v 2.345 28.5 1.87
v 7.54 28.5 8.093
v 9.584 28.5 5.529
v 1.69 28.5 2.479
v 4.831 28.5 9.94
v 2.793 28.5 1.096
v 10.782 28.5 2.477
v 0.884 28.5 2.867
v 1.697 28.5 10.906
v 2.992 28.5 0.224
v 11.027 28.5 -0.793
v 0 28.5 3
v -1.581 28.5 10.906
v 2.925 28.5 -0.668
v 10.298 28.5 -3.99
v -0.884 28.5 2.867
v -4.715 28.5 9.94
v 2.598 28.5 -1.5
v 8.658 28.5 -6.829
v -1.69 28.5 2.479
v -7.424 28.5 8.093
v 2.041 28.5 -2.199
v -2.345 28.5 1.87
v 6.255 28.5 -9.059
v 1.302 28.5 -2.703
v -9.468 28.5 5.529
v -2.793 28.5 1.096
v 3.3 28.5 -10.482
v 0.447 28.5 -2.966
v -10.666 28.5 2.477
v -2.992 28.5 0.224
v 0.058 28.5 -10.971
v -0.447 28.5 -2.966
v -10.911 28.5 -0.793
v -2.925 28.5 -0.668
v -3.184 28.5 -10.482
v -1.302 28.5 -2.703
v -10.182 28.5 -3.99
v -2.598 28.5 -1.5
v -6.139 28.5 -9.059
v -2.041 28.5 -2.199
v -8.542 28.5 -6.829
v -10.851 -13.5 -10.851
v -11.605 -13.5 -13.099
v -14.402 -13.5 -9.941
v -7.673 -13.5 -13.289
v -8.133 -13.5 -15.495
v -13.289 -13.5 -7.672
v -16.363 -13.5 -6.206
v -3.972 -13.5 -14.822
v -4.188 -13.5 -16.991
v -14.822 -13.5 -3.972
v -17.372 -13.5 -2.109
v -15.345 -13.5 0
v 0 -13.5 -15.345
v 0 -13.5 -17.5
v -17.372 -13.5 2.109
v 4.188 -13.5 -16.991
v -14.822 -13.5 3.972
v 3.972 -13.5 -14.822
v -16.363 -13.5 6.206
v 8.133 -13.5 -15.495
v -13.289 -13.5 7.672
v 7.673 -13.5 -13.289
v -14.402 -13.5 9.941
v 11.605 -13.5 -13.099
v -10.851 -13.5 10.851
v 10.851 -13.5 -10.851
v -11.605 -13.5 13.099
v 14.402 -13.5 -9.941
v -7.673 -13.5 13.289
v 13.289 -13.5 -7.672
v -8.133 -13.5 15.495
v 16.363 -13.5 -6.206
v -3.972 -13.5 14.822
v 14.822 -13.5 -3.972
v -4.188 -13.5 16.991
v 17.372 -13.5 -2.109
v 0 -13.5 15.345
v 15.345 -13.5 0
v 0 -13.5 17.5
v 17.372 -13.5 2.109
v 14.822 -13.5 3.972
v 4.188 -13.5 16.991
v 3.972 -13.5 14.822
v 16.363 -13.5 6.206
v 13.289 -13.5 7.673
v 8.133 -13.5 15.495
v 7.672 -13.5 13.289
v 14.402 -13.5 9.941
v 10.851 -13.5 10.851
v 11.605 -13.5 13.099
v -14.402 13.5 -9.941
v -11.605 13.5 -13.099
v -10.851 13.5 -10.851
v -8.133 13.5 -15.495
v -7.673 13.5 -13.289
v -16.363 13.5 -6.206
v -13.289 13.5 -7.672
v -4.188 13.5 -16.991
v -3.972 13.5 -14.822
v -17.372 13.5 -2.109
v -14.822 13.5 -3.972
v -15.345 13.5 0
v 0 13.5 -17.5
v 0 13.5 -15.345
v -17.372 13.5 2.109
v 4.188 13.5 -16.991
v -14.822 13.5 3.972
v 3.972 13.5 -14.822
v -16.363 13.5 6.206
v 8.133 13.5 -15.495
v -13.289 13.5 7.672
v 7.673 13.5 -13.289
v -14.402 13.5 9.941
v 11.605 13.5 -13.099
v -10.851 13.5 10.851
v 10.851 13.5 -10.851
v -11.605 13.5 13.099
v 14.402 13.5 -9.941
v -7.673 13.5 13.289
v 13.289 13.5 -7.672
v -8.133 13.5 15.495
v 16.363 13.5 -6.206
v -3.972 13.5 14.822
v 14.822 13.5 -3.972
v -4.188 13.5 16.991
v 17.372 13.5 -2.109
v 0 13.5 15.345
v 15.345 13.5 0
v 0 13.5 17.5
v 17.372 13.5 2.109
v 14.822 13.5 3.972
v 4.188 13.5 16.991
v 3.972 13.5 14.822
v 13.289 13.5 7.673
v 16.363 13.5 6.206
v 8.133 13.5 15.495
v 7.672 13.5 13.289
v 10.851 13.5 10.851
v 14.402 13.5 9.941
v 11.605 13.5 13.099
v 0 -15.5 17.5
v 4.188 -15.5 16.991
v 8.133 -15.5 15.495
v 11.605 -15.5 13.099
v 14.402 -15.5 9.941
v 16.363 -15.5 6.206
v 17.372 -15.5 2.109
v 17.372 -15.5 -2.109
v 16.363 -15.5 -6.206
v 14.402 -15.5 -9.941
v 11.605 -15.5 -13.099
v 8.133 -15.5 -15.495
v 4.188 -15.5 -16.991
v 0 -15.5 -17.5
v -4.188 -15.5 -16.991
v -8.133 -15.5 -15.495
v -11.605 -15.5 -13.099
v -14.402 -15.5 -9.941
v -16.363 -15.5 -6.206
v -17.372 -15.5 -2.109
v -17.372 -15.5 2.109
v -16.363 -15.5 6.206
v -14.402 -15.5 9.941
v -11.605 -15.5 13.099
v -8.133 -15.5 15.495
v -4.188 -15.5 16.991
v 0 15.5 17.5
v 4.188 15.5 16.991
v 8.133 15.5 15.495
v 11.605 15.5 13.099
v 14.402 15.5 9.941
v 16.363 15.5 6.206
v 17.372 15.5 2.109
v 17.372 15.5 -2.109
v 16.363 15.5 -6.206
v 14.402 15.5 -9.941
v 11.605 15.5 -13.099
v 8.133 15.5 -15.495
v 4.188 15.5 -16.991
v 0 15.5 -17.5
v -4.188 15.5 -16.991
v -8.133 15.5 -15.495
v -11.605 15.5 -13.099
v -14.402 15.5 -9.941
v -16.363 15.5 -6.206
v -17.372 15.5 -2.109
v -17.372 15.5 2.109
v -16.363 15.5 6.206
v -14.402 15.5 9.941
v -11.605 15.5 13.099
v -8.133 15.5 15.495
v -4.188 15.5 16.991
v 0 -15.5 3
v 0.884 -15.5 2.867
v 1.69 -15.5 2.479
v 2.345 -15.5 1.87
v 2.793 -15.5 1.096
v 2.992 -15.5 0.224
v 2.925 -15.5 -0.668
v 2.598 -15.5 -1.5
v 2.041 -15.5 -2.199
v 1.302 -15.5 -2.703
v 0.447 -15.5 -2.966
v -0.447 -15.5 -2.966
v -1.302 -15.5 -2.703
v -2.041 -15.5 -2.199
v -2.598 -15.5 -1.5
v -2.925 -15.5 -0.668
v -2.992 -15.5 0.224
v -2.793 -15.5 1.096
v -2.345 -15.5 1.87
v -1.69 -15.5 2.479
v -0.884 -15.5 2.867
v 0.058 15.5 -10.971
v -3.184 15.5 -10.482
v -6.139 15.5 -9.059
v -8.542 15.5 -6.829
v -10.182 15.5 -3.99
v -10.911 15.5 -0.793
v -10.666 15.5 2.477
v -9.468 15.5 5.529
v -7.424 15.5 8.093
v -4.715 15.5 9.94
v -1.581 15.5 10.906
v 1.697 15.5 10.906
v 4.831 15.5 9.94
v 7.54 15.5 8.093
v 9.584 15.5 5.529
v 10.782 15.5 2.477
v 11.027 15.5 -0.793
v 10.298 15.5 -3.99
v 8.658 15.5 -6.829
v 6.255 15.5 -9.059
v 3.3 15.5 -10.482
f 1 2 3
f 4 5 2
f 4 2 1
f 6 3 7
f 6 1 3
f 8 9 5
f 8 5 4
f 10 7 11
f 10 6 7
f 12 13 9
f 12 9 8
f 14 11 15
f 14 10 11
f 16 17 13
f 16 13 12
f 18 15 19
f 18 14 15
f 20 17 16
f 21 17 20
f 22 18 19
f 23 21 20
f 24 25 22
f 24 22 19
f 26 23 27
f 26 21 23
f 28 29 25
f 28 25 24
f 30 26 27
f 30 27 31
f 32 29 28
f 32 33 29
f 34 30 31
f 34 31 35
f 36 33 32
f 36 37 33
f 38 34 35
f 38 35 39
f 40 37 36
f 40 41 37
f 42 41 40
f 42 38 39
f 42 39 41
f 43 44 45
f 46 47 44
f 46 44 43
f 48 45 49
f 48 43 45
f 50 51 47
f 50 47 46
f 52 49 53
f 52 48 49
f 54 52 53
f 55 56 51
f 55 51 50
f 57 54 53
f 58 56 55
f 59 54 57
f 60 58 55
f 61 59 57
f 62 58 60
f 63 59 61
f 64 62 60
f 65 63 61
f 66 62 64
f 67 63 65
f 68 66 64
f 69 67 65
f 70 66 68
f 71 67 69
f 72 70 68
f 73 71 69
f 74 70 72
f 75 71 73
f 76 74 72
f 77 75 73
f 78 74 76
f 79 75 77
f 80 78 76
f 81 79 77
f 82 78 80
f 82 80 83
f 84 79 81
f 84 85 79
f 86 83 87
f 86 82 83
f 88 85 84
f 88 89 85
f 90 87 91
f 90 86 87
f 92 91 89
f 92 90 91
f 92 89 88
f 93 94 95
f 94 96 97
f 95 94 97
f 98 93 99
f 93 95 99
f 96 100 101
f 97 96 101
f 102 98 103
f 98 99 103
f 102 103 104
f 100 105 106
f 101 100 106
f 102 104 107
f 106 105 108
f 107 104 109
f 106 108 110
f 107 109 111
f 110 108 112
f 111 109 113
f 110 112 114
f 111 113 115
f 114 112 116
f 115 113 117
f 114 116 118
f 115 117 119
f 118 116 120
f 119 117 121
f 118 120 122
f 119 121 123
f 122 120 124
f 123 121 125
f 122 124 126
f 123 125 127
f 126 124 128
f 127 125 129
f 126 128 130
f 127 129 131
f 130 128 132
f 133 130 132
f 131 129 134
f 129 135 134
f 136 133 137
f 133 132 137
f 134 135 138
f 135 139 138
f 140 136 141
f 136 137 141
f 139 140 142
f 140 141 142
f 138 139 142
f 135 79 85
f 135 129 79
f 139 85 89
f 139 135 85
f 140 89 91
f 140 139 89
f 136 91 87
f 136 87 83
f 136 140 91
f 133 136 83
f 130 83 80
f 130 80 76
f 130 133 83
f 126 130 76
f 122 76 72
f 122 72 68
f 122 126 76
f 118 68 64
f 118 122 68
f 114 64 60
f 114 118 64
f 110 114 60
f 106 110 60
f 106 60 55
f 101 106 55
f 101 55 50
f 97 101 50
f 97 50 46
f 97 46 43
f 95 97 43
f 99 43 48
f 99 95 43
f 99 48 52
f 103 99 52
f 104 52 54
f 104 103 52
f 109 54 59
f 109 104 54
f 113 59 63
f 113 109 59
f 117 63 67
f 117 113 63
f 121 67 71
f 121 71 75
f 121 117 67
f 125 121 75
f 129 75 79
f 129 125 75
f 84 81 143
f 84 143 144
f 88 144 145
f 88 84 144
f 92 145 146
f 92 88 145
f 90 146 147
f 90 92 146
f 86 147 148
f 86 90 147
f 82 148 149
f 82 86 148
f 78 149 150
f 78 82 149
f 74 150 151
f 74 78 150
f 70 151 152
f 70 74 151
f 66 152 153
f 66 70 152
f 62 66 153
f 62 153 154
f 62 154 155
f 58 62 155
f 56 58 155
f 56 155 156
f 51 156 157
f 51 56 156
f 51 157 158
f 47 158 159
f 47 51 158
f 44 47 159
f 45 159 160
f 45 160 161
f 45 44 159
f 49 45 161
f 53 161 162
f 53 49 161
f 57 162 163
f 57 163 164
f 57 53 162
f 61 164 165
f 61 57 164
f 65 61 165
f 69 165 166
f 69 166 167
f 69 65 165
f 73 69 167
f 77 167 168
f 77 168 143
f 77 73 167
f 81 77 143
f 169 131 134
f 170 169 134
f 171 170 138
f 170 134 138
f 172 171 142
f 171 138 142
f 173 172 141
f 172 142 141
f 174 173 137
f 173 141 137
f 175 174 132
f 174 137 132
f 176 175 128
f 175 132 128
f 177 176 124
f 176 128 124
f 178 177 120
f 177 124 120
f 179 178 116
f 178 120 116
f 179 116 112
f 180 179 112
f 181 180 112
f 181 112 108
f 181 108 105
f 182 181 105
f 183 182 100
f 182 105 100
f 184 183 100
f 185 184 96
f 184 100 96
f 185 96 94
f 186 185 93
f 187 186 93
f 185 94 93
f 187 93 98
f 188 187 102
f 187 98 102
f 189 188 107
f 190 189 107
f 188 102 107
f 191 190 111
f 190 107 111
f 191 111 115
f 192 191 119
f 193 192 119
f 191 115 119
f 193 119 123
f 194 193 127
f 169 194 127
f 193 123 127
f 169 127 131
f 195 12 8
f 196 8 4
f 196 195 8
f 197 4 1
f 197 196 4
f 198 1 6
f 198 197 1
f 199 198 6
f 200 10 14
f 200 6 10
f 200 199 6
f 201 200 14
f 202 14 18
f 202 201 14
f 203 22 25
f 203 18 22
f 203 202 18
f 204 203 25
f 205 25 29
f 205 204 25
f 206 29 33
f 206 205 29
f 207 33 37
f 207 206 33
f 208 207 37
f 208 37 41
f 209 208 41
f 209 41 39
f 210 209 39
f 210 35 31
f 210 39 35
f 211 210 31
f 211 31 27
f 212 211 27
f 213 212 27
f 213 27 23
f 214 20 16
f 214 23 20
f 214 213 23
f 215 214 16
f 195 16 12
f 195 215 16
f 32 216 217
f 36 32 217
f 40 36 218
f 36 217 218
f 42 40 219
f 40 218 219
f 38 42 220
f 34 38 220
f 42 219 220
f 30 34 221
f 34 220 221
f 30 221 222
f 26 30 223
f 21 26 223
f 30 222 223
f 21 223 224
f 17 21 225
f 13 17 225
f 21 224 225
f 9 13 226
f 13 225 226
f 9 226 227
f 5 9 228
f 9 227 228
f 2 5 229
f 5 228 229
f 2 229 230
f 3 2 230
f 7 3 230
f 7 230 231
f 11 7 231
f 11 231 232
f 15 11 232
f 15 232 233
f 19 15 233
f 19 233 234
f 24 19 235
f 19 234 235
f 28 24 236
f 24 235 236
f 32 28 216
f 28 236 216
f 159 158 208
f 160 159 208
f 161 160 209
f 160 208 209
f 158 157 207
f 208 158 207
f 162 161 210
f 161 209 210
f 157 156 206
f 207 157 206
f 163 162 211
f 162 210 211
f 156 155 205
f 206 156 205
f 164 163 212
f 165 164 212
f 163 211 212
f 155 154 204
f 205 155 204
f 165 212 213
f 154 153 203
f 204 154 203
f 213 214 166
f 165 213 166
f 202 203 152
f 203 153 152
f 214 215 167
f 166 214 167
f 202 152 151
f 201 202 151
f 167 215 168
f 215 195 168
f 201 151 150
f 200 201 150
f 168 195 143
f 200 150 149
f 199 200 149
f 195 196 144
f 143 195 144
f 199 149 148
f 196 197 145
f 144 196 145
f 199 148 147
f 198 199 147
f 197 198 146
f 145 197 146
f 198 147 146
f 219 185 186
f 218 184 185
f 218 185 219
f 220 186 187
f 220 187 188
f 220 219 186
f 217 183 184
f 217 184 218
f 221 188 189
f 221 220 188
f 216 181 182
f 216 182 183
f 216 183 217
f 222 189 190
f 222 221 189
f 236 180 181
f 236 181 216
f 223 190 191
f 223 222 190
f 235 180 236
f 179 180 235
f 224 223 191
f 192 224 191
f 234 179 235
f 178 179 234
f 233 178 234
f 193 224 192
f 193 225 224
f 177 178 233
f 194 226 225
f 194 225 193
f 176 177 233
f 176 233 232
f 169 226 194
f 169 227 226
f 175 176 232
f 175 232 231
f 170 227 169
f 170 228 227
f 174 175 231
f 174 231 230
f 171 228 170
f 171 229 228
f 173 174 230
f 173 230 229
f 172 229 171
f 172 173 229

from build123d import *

# Parameters (mm, degrees)
SKETCH_1_R          = 15.345
EXTRUDE_1_DEPTH     = 13.5
SKETCH_2_R          = 17.5
EXTRUDE_2_DEPTH     = 2
SKETCH_4_R          = 11
EXTRUDE_3_DEPTH     = 13
SKETCH_3_R          = 3
CUT_EXTRUDE_1_DEPTH = 51.482670294


with BuildPart() as part:
    # 草图1 → 凸台-拉伸1 (new, symmetric)
    with BuildSketch(Plane(origin=(0, 0, 0), x_dir=(1, 0, 0), z_dir=(0, 1, 0))):
        with Locations(Location((0, 0, 0), (0, 0, 270))):
            Circle(SKETCH_1_R)
    extrude(amount=EXTRUDE_1_DEPTH, both=True)

    # 草图2 → 凸台-拉伸2 (add)
    with BuildSketch(Plane(origin=(0, 13.5, 0), x_dir=(1, 0, 0), z_dir=(0, 1, 0))):
        with Locations(Location((0, 0, 0), (0, 0, 270))):
            Circle(SKETCH_2_R)
    extrude_2 = extrude(amount=EXTRUDE_2_DEPTH)

    # 镜向1: 凸台-拉伸2 across plane
    add(extrude_2.mirror(Plane.ZX))

    # 草图4 → 凸台-拉伸3 (add)
    with BuildSketch(Plane(origin=(0, 15.5, 0), x_dir=(1, 0, 0), z_dir=(0, 1, 0))):
        with Locations(Location((0.058014503, -0.029170846, 0), (0, 0, 90))):
            Circle(SKETCH_4_R)
    extrude(amount=EXTRUDE_3_DEPTH)

    # 草图3 → 切除-拉伸1 (cut, through all)
    with BuildSketch(Plane(origin=(0, -15.5, 0), x_dir=(1, 0, 0), z_dir=(0, 1, 0))):
        with Locations(Location((0, 0, 0), (0, 0, 270))):
            Circle(SKETCH_3_R)
    extrude(amount=CUT_EXTRUDE_1_DEPTH, mode=Mode.SUBTRACT)


solid = part.part
